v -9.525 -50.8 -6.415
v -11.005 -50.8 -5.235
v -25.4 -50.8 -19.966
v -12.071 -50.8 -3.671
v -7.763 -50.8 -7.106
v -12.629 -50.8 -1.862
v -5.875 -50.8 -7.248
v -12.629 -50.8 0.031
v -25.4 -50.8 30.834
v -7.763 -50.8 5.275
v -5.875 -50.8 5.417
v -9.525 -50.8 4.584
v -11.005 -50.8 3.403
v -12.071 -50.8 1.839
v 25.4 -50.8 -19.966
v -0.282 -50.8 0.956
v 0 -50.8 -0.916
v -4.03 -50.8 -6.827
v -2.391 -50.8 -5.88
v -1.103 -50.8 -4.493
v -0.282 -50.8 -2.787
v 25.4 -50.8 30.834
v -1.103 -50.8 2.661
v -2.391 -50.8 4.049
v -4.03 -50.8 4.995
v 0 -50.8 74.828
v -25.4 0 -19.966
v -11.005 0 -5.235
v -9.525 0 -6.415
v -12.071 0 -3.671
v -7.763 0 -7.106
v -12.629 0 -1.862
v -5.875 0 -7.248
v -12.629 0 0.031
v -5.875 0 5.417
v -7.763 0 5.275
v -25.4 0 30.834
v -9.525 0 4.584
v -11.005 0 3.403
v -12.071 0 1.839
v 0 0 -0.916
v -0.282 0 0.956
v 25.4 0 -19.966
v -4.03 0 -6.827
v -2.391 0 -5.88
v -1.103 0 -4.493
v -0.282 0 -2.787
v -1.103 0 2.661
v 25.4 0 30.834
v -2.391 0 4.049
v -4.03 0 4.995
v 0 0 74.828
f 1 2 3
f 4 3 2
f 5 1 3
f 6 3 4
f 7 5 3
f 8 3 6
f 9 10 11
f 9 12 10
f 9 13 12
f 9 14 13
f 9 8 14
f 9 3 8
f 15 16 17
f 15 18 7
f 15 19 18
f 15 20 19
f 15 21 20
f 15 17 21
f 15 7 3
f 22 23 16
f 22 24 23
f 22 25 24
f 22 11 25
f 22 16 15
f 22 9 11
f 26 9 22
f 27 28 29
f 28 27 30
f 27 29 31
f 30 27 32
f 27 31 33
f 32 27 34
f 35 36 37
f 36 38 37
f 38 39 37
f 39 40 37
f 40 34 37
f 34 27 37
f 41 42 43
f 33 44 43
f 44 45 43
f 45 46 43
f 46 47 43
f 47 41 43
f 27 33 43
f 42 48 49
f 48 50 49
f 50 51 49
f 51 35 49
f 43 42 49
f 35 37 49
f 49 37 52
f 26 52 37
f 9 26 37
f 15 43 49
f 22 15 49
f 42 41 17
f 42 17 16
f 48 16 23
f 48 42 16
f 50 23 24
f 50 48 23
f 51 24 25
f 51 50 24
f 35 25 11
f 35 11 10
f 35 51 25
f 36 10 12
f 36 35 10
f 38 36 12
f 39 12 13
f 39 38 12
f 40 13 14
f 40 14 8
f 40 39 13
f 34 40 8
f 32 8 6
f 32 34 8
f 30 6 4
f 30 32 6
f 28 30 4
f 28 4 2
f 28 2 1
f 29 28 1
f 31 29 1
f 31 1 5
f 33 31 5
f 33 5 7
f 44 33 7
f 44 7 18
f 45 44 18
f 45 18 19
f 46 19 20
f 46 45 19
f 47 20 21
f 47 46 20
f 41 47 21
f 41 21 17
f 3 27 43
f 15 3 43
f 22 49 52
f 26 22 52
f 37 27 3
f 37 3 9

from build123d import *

# Parameters (mm, degrees)
F0_W     = 50.8
F0_H     = 50.8
F0_R     = 6.35
F1_DEPTH = 50.8


with BuildPart() as f1:
    # F0 (on Front) → F1 (new body)
    with BuildSketch(Plane.XZ):
        Polygon((0, 74.828401), (-25.4, 30.834311), (25.4, 30.834311), align=None)
        with Locations((0, 5.434311)):
            Rectangle(F0_W, F0_H)
        with Locations((-6.35, -0.915689)):
            Circle(F0_R, mode=Mode.SUBTRACT)
    extrude(amount=F1_DEPTH)


solid = f1.part
